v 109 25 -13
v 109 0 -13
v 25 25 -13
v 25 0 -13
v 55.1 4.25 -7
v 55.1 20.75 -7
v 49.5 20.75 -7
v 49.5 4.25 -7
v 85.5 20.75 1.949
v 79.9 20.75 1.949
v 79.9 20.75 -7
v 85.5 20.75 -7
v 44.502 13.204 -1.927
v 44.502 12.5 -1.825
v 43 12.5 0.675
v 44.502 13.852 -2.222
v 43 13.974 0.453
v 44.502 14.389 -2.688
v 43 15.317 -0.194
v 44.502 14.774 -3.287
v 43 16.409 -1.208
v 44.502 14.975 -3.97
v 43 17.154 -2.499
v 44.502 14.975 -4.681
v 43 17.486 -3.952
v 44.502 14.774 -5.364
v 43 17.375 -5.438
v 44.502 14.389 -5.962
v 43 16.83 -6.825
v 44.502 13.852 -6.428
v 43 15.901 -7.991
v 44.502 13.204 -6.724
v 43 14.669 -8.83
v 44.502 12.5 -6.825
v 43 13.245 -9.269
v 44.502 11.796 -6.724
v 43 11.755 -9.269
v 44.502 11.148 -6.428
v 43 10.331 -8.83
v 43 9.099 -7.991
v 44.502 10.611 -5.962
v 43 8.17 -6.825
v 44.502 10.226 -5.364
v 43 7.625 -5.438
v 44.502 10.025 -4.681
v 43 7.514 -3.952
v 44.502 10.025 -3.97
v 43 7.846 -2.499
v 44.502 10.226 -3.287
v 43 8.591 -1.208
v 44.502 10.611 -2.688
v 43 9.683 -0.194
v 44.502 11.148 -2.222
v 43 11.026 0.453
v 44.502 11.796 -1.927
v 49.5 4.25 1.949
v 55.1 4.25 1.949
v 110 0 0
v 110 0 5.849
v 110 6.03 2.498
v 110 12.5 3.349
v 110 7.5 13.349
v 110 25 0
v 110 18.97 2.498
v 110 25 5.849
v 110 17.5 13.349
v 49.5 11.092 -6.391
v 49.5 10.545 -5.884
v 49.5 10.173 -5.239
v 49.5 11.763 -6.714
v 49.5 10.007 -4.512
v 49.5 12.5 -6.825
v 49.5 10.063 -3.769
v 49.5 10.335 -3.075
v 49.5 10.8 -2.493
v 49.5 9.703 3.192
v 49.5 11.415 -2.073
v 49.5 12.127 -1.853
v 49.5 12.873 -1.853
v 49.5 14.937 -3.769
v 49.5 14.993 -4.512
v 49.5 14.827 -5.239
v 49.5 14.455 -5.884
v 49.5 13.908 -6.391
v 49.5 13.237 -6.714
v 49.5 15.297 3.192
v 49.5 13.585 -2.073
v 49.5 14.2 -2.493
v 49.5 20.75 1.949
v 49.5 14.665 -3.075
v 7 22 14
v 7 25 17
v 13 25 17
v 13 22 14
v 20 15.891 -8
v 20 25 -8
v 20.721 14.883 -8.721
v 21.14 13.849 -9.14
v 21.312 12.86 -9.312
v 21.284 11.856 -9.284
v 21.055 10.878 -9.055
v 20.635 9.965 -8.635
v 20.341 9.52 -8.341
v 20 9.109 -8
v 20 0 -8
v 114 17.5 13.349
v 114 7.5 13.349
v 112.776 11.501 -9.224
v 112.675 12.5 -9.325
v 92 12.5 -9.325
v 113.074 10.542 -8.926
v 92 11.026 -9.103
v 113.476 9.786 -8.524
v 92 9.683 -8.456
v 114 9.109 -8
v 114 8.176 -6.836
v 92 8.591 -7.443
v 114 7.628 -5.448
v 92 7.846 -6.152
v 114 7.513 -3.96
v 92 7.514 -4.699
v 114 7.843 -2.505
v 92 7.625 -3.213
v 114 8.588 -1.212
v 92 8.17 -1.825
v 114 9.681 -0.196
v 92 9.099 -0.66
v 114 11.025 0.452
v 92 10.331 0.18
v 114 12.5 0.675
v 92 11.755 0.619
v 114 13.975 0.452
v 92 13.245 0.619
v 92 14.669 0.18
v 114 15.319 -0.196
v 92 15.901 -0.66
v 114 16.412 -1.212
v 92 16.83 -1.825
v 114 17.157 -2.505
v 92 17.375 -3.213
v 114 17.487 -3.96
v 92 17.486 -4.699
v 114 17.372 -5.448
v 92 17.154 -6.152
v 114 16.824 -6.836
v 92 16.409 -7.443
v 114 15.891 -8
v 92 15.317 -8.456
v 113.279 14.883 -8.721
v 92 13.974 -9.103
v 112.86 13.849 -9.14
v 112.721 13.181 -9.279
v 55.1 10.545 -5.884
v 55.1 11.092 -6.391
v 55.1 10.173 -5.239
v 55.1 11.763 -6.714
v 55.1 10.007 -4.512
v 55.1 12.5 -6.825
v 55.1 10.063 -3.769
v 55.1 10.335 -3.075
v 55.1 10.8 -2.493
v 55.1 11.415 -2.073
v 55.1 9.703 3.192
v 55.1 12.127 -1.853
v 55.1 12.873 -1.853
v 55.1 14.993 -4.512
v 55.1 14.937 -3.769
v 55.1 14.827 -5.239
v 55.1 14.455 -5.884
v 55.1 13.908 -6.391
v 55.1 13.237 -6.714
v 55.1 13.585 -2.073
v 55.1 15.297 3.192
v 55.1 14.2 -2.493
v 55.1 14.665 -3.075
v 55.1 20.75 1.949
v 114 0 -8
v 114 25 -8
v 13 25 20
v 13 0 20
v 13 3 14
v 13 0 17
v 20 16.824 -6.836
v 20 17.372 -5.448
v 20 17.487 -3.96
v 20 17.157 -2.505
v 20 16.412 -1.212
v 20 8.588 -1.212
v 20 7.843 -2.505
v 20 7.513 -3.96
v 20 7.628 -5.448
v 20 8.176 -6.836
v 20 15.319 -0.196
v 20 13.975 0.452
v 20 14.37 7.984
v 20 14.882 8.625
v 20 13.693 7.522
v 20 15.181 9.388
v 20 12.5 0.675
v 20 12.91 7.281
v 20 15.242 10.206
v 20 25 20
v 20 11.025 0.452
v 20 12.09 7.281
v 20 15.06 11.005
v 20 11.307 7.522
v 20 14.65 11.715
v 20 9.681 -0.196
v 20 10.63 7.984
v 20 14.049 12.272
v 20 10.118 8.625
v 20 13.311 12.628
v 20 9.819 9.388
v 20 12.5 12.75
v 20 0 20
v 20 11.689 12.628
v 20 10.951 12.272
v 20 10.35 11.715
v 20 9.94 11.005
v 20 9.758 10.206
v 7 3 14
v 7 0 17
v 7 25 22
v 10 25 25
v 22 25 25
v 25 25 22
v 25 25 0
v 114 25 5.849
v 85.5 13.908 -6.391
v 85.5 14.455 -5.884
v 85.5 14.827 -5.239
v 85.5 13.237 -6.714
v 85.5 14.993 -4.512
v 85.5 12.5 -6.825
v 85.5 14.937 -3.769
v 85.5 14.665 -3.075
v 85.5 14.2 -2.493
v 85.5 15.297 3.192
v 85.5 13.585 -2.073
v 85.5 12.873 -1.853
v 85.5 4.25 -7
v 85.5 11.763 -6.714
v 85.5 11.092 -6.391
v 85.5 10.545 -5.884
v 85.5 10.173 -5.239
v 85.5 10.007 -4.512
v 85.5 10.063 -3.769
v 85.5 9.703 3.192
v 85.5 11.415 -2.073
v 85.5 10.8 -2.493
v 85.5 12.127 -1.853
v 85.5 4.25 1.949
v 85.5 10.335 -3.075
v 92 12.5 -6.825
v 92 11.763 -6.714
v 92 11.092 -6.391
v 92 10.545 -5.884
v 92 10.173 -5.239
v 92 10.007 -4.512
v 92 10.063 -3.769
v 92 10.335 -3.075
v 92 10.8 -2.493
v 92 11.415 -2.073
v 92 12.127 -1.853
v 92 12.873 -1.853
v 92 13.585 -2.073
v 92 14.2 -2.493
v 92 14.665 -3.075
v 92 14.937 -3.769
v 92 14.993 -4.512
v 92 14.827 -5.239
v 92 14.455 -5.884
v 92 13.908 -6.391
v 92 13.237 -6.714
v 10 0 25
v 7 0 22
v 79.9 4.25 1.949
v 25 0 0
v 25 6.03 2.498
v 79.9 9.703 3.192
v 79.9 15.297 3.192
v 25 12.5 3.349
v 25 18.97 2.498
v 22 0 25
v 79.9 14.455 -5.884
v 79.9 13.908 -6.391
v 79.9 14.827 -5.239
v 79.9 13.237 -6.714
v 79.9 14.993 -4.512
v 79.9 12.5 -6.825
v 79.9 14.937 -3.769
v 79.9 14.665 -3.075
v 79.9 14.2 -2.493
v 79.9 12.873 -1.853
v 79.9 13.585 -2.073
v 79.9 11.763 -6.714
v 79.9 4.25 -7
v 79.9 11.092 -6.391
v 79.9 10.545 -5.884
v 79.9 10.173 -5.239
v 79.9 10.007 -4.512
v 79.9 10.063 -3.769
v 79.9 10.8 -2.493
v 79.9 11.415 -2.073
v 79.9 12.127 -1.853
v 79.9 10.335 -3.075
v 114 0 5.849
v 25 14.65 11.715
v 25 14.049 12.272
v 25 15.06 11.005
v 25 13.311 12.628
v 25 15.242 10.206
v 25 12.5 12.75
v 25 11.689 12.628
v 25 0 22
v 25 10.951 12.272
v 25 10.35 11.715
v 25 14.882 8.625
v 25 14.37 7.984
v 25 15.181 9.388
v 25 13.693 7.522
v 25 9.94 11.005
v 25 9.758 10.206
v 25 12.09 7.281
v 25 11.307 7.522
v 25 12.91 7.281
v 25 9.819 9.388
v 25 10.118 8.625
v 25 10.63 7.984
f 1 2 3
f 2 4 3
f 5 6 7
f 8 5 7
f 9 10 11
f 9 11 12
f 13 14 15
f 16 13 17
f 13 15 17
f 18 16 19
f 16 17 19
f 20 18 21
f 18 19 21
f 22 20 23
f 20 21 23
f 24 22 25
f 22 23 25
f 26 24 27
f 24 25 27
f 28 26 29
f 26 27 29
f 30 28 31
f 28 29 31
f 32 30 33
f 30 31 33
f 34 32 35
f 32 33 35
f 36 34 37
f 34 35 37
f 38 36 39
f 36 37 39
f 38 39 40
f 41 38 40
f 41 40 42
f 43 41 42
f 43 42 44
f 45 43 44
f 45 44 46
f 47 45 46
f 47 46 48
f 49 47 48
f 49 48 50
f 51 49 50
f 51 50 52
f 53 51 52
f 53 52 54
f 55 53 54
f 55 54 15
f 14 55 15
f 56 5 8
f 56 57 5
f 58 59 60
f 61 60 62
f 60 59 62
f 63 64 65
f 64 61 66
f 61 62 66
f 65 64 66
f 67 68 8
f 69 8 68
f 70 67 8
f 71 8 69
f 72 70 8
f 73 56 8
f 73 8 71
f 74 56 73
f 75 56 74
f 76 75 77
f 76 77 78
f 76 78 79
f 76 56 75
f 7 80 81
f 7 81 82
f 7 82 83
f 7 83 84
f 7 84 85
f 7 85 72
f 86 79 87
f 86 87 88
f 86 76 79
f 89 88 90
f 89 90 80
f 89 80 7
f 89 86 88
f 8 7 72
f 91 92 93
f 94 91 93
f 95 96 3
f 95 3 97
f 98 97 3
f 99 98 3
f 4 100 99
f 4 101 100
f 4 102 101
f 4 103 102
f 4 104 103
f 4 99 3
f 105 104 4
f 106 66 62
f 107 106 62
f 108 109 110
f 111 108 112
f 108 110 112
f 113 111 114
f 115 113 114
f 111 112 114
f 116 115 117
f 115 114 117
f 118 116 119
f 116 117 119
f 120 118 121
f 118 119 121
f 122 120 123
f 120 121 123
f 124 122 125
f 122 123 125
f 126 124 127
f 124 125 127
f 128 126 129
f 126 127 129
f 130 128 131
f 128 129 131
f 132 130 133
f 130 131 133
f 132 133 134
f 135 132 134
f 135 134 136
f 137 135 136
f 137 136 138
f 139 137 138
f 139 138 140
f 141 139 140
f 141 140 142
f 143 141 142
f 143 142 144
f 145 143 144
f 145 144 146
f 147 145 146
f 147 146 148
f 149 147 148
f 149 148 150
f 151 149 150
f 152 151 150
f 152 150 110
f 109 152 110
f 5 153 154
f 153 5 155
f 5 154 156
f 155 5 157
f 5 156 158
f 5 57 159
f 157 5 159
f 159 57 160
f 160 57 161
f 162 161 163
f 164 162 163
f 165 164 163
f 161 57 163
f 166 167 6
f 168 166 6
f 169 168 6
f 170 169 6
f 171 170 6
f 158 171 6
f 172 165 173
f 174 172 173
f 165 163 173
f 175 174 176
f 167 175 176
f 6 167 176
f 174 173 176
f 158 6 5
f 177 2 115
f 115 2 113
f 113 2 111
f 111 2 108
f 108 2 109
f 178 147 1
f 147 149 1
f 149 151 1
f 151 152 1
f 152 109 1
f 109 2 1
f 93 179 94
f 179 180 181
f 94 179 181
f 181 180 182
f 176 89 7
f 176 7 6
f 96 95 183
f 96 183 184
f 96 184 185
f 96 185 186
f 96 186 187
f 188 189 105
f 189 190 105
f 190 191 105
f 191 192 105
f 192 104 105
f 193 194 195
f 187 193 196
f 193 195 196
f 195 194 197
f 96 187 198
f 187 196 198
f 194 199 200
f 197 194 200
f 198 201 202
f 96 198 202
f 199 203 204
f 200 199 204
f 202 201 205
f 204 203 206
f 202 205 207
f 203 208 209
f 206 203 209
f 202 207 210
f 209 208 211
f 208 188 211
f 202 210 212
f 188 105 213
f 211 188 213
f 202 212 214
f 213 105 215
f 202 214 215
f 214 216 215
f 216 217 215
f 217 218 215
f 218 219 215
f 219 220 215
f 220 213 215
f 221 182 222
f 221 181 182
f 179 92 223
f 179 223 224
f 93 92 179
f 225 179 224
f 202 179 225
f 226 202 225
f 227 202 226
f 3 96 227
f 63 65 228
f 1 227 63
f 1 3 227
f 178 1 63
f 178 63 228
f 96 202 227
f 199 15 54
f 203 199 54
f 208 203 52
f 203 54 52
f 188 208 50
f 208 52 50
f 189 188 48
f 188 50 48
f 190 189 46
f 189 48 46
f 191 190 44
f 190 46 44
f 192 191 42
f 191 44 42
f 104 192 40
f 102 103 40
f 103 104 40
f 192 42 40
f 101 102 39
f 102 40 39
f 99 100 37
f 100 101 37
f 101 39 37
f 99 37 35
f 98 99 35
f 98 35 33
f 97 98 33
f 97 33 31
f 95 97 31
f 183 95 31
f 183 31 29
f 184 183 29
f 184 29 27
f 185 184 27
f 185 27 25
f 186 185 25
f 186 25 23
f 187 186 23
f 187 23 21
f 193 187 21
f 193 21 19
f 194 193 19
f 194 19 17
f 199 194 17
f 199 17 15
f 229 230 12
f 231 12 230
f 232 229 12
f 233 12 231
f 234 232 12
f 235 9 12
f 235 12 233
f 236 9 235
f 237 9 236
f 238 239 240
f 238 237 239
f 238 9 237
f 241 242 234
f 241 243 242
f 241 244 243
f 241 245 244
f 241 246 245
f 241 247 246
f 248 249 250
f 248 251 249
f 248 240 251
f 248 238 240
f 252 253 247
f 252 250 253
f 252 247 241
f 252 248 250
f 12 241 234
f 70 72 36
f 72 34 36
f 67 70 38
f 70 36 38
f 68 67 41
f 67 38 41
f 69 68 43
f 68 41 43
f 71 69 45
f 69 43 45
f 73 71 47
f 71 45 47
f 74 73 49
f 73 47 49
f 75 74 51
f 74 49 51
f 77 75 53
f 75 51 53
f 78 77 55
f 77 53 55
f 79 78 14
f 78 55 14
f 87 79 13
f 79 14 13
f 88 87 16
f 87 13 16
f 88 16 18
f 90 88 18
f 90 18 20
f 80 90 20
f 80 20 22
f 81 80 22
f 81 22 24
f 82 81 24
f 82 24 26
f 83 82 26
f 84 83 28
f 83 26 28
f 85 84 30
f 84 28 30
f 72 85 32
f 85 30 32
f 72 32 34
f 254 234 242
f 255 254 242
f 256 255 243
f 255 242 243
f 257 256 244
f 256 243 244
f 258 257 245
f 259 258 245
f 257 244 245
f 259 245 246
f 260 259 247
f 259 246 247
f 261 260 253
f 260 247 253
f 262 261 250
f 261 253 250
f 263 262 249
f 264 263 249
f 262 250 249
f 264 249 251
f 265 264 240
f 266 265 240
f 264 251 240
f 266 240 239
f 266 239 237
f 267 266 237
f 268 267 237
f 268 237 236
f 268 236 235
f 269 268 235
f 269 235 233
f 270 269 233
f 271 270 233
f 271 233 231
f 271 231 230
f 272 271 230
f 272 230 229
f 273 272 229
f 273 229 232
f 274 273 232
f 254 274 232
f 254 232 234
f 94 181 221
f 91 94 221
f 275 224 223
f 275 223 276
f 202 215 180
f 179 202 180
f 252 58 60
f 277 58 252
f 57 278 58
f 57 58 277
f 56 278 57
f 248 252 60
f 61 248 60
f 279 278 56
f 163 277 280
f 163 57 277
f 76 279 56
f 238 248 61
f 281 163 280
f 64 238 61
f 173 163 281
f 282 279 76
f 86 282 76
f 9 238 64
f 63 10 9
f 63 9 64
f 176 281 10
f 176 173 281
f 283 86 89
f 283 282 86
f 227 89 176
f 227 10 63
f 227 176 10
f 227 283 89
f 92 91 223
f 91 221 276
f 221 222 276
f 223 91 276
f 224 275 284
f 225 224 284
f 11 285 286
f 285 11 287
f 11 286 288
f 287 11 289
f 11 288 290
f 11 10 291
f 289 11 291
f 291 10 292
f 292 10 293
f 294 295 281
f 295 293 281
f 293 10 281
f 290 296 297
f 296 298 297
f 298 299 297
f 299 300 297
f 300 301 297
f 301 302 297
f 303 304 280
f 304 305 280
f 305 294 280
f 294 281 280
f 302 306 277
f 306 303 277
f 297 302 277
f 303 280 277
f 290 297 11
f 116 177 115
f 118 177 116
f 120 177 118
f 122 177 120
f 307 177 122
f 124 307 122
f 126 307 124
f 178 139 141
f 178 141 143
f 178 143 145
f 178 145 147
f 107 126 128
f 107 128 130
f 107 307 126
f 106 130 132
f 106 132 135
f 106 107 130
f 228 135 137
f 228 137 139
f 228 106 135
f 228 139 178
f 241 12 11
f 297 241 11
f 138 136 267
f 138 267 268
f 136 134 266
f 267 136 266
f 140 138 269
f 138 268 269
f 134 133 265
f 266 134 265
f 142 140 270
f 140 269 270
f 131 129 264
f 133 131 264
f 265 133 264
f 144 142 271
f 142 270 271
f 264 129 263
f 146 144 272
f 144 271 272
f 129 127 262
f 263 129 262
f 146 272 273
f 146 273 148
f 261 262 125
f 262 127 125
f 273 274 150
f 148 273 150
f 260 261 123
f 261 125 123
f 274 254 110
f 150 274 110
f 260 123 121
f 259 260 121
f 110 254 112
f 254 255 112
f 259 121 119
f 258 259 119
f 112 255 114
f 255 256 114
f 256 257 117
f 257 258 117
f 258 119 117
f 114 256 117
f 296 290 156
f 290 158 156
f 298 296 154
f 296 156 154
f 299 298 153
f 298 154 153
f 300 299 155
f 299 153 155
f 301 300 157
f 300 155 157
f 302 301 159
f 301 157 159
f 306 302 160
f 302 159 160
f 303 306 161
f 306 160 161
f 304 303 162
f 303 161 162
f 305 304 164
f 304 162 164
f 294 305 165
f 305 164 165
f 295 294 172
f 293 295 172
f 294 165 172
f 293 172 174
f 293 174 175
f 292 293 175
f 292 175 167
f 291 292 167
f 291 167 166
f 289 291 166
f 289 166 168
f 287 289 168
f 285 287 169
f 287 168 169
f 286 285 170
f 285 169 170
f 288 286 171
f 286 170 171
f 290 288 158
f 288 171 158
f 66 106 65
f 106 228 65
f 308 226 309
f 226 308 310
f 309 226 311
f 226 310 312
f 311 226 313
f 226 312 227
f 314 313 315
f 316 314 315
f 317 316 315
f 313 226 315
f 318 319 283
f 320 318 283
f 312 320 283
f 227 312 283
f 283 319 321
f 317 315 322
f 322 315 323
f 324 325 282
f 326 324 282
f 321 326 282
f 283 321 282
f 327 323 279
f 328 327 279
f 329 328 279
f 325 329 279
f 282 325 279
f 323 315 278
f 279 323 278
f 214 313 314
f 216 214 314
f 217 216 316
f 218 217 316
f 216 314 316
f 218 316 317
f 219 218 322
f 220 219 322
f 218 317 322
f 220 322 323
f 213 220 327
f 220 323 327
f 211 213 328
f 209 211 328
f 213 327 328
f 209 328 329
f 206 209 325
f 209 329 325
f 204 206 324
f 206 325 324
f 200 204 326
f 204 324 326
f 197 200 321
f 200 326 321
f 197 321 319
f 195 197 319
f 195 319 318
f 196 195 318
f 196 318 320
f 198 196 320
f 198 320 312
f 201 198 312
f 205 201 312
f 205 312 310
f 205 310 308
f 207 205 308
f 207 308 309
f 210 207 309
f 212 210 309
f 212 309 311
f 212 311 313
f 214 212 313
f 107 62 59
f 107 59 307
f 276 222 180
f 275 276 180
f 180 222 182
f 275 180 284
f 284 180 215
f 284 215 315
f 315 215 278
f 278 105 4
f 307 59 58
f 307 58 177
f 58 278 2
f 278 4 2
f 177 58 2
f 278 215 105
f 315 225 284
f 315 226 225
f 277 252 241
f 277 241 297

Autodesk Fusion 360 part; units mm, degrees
sketch "Sketch1" plane through (0, 0, 0) normal (0, 1, 0) x (1, 0, 0)
  line L0 (0, 0) -> (20, 0)
  line L1 (20, 0) -> (20, -20)
  line L2 (20, -20) -> (0, -20)
  line L3 (0, -20) -> (0, 0)
  line L4 (10, -20) -> (10, -25) construction
  line L5 (7, -25) -> (13, -25)
  line L6 (13, -25) -> (13, -14)
  line L7 (13, -14) -> (7, -14)
  line L8 (7, -14) -> (7, -25)
  line L9 (13, -25) -> (25, -25)
  line L10 (25, -25) -> (25, 0)
  line L11 (25, 0) -> (20, 0)
  dimension "d1" = 20
  dimension "d2" = 20
  dimension "d3" = 5
  dimension "d4" = 6
  dimension "d5" = 6
  dimension "d6" = 5
extrude "Extrude1" add sketch "Sketch1" along normal blind 25 contours L1 L2 L6 L9 L10 L11 | L2 L6 L7 L8 | L2 L5 L6 L8
hole "Hole3" at (20, 12.5, 10) direction (1, 0, 0) diameter 5.5 depth 11 tip angle 180
sketch "Sketch2" plane through (25, 0, 0) normal (1, 0, 0) x (0, 1, 0)
  line L0 (0, 25) -> (0, 0)
  line L1 (0, 0) -> (25, 0)
  line L2 (25, 0) -> (25, 25)
  line L3 (25, 25) -> (0, 25)
  arc A0 (25, 0) -> (0, 0) centre (12.5, -21.6506) ccw
  line L4 (0, 0) -> (0, -13)
  circle A1 centre (12.5, 10) radius 2.75
  line L5 (0, -13) -> (1.1286, -13)
  line L6 (1.1286, -13) -> (25, -13)
  line L7 (25, -13) -> (25, 0)
  dimension "d9" = 25
  dimension "d62" = 13
extrude "Extrude2" add sketch "Sketch2" along normal blind 85 and the other way blind 5 contours L1 A0 | L1 L4 L5 L6 L7
sketch "Sketch3" plane through (110, 0, 0) normal (1, 0, 0) x (0, 1, 0)
  arc A0 (25, 0) -> (0, 0) centre (12.5, -21.6506) ccw
  line L0 (0, 0) -> (0, -13)
  line L1 (25, -13) -> (25, 0)
  line L2 (12.5, -16.6506) -> (12.5, 13.3494) construction
  line L3 (25, 13.3494) -> (25, 0)
  line L4 (25, 13.3494) -> (0, 13.3494)
  line L5 (0, 13.3494) -> (0, 0)
  line L6 (0, -13) -> (25, -13)
  dimension "d12" = 10
  dimension "d13" = 25
extrude "Extrude3" add sketch "Sketch3" along normal blind 4
chamfer "Chamfer1" distance 3 angle 45 2 edges at (7, 12.5, 25) (25, 12.5, 25)
chamfer "Chamfer2" distance 3 angle 45 2 edges at (10, 0, 14) (10, 25, 14)
chamfer "Chamfer5" distance 7.5 angle 45 2 edges at (112, 0, 13.3494) (112, 25, 13.3494)
chamfer "Chamfer6" distance 5 angle 45 2 edges at (20, 12.5, -13) (114, 12.5, -13)
sketch "Sketch4" plane through (0, 0, 25) normal (0, 0, 1) x (-1, 0, 0)
  line L0 (-25, -25) -> (-25, 0)
  line L1 (-25, 0) -> (-110, 0)
  line L2 (-110, 0) -> (-110, -25)
  line L3 (-110, -25) -> (-25, -25)
  line L4 (-67.5, -25) -> (-67.5, 0) construction
  line L5 (-49.5, -25) -> (-85.5, -25)
  line L6 (-85.5, -25) -> (-85.5, 0)
  line L7 (-85.5, 0) -> (-49.5, 0)
  line L8 (-49.5, 0) -> (-49.5, -25)
  line L9 (-55.1, -25) -> (-79.9, -25)
  line L10 (-79.9, -25) -> (-79.9, 0)
  line L11 (-79.9, 0) -> (-55.1, 0)
  line L12 (-55.1, 0) -> (-55.1, -25)
  line L13 (-49.5, -12.5) -> (-85.5, -12.5) construction
  line L14 (-49.5, -20.75) -> (-85.5, -20.75)
  line L15 (-85.5, -20.75) -> (-85.5, -4.25)
  line L16 (-85.5, -4.25) -> (-49.5, -4.25)
  line L17 (-49.5, -4.25) -> (-49.5, -20.75)
  line L18 (-64.5, -20.75) -> (-70.5, -20.75)
  line L19 (-70.5, -20.75) -> (-70.5, -4.25)
  line L20 (-70.5, -4.25) -> (-64.5, -4.25)
  line L21 (-64.5, -4.25) -> (-64.5, -20.75)
  line L22 (-22, 0) -> (-22, -25)
  line L23 (-22, -25) -> (-10, -25)
  line L24 (-10, -25) -> (-10, 0)
  line L25 (-10, 0) -> (-22, 0)
  dimension "d22" = 36
  dimension "d23" = 5.6
  dimension "d24" = 20
  dimension "d25" = 16.5
  dimension "d29" = 21.5
  dimension "d31" = 6
extrude "Extrude4" cut sketch "Sketch4" against normal blind 27 from surface at -5 contours L8 L12 L14 L16 L17 | L6 L10 L14 L15 L16
hole "Hole1" at (114, 12.5, -4.3253) direction (-1, 0, 0) diameter 5 depth 100 tip angle 118 counterbore diameter 10 counterbore depth 22
hole "Hole2" at (20, 12.5, -4.3253) direction (1, 0, 0) diameter 10 depth 23 tip angle 118
equation "d62 = 5 mm + 4 mm + 4 mm"
